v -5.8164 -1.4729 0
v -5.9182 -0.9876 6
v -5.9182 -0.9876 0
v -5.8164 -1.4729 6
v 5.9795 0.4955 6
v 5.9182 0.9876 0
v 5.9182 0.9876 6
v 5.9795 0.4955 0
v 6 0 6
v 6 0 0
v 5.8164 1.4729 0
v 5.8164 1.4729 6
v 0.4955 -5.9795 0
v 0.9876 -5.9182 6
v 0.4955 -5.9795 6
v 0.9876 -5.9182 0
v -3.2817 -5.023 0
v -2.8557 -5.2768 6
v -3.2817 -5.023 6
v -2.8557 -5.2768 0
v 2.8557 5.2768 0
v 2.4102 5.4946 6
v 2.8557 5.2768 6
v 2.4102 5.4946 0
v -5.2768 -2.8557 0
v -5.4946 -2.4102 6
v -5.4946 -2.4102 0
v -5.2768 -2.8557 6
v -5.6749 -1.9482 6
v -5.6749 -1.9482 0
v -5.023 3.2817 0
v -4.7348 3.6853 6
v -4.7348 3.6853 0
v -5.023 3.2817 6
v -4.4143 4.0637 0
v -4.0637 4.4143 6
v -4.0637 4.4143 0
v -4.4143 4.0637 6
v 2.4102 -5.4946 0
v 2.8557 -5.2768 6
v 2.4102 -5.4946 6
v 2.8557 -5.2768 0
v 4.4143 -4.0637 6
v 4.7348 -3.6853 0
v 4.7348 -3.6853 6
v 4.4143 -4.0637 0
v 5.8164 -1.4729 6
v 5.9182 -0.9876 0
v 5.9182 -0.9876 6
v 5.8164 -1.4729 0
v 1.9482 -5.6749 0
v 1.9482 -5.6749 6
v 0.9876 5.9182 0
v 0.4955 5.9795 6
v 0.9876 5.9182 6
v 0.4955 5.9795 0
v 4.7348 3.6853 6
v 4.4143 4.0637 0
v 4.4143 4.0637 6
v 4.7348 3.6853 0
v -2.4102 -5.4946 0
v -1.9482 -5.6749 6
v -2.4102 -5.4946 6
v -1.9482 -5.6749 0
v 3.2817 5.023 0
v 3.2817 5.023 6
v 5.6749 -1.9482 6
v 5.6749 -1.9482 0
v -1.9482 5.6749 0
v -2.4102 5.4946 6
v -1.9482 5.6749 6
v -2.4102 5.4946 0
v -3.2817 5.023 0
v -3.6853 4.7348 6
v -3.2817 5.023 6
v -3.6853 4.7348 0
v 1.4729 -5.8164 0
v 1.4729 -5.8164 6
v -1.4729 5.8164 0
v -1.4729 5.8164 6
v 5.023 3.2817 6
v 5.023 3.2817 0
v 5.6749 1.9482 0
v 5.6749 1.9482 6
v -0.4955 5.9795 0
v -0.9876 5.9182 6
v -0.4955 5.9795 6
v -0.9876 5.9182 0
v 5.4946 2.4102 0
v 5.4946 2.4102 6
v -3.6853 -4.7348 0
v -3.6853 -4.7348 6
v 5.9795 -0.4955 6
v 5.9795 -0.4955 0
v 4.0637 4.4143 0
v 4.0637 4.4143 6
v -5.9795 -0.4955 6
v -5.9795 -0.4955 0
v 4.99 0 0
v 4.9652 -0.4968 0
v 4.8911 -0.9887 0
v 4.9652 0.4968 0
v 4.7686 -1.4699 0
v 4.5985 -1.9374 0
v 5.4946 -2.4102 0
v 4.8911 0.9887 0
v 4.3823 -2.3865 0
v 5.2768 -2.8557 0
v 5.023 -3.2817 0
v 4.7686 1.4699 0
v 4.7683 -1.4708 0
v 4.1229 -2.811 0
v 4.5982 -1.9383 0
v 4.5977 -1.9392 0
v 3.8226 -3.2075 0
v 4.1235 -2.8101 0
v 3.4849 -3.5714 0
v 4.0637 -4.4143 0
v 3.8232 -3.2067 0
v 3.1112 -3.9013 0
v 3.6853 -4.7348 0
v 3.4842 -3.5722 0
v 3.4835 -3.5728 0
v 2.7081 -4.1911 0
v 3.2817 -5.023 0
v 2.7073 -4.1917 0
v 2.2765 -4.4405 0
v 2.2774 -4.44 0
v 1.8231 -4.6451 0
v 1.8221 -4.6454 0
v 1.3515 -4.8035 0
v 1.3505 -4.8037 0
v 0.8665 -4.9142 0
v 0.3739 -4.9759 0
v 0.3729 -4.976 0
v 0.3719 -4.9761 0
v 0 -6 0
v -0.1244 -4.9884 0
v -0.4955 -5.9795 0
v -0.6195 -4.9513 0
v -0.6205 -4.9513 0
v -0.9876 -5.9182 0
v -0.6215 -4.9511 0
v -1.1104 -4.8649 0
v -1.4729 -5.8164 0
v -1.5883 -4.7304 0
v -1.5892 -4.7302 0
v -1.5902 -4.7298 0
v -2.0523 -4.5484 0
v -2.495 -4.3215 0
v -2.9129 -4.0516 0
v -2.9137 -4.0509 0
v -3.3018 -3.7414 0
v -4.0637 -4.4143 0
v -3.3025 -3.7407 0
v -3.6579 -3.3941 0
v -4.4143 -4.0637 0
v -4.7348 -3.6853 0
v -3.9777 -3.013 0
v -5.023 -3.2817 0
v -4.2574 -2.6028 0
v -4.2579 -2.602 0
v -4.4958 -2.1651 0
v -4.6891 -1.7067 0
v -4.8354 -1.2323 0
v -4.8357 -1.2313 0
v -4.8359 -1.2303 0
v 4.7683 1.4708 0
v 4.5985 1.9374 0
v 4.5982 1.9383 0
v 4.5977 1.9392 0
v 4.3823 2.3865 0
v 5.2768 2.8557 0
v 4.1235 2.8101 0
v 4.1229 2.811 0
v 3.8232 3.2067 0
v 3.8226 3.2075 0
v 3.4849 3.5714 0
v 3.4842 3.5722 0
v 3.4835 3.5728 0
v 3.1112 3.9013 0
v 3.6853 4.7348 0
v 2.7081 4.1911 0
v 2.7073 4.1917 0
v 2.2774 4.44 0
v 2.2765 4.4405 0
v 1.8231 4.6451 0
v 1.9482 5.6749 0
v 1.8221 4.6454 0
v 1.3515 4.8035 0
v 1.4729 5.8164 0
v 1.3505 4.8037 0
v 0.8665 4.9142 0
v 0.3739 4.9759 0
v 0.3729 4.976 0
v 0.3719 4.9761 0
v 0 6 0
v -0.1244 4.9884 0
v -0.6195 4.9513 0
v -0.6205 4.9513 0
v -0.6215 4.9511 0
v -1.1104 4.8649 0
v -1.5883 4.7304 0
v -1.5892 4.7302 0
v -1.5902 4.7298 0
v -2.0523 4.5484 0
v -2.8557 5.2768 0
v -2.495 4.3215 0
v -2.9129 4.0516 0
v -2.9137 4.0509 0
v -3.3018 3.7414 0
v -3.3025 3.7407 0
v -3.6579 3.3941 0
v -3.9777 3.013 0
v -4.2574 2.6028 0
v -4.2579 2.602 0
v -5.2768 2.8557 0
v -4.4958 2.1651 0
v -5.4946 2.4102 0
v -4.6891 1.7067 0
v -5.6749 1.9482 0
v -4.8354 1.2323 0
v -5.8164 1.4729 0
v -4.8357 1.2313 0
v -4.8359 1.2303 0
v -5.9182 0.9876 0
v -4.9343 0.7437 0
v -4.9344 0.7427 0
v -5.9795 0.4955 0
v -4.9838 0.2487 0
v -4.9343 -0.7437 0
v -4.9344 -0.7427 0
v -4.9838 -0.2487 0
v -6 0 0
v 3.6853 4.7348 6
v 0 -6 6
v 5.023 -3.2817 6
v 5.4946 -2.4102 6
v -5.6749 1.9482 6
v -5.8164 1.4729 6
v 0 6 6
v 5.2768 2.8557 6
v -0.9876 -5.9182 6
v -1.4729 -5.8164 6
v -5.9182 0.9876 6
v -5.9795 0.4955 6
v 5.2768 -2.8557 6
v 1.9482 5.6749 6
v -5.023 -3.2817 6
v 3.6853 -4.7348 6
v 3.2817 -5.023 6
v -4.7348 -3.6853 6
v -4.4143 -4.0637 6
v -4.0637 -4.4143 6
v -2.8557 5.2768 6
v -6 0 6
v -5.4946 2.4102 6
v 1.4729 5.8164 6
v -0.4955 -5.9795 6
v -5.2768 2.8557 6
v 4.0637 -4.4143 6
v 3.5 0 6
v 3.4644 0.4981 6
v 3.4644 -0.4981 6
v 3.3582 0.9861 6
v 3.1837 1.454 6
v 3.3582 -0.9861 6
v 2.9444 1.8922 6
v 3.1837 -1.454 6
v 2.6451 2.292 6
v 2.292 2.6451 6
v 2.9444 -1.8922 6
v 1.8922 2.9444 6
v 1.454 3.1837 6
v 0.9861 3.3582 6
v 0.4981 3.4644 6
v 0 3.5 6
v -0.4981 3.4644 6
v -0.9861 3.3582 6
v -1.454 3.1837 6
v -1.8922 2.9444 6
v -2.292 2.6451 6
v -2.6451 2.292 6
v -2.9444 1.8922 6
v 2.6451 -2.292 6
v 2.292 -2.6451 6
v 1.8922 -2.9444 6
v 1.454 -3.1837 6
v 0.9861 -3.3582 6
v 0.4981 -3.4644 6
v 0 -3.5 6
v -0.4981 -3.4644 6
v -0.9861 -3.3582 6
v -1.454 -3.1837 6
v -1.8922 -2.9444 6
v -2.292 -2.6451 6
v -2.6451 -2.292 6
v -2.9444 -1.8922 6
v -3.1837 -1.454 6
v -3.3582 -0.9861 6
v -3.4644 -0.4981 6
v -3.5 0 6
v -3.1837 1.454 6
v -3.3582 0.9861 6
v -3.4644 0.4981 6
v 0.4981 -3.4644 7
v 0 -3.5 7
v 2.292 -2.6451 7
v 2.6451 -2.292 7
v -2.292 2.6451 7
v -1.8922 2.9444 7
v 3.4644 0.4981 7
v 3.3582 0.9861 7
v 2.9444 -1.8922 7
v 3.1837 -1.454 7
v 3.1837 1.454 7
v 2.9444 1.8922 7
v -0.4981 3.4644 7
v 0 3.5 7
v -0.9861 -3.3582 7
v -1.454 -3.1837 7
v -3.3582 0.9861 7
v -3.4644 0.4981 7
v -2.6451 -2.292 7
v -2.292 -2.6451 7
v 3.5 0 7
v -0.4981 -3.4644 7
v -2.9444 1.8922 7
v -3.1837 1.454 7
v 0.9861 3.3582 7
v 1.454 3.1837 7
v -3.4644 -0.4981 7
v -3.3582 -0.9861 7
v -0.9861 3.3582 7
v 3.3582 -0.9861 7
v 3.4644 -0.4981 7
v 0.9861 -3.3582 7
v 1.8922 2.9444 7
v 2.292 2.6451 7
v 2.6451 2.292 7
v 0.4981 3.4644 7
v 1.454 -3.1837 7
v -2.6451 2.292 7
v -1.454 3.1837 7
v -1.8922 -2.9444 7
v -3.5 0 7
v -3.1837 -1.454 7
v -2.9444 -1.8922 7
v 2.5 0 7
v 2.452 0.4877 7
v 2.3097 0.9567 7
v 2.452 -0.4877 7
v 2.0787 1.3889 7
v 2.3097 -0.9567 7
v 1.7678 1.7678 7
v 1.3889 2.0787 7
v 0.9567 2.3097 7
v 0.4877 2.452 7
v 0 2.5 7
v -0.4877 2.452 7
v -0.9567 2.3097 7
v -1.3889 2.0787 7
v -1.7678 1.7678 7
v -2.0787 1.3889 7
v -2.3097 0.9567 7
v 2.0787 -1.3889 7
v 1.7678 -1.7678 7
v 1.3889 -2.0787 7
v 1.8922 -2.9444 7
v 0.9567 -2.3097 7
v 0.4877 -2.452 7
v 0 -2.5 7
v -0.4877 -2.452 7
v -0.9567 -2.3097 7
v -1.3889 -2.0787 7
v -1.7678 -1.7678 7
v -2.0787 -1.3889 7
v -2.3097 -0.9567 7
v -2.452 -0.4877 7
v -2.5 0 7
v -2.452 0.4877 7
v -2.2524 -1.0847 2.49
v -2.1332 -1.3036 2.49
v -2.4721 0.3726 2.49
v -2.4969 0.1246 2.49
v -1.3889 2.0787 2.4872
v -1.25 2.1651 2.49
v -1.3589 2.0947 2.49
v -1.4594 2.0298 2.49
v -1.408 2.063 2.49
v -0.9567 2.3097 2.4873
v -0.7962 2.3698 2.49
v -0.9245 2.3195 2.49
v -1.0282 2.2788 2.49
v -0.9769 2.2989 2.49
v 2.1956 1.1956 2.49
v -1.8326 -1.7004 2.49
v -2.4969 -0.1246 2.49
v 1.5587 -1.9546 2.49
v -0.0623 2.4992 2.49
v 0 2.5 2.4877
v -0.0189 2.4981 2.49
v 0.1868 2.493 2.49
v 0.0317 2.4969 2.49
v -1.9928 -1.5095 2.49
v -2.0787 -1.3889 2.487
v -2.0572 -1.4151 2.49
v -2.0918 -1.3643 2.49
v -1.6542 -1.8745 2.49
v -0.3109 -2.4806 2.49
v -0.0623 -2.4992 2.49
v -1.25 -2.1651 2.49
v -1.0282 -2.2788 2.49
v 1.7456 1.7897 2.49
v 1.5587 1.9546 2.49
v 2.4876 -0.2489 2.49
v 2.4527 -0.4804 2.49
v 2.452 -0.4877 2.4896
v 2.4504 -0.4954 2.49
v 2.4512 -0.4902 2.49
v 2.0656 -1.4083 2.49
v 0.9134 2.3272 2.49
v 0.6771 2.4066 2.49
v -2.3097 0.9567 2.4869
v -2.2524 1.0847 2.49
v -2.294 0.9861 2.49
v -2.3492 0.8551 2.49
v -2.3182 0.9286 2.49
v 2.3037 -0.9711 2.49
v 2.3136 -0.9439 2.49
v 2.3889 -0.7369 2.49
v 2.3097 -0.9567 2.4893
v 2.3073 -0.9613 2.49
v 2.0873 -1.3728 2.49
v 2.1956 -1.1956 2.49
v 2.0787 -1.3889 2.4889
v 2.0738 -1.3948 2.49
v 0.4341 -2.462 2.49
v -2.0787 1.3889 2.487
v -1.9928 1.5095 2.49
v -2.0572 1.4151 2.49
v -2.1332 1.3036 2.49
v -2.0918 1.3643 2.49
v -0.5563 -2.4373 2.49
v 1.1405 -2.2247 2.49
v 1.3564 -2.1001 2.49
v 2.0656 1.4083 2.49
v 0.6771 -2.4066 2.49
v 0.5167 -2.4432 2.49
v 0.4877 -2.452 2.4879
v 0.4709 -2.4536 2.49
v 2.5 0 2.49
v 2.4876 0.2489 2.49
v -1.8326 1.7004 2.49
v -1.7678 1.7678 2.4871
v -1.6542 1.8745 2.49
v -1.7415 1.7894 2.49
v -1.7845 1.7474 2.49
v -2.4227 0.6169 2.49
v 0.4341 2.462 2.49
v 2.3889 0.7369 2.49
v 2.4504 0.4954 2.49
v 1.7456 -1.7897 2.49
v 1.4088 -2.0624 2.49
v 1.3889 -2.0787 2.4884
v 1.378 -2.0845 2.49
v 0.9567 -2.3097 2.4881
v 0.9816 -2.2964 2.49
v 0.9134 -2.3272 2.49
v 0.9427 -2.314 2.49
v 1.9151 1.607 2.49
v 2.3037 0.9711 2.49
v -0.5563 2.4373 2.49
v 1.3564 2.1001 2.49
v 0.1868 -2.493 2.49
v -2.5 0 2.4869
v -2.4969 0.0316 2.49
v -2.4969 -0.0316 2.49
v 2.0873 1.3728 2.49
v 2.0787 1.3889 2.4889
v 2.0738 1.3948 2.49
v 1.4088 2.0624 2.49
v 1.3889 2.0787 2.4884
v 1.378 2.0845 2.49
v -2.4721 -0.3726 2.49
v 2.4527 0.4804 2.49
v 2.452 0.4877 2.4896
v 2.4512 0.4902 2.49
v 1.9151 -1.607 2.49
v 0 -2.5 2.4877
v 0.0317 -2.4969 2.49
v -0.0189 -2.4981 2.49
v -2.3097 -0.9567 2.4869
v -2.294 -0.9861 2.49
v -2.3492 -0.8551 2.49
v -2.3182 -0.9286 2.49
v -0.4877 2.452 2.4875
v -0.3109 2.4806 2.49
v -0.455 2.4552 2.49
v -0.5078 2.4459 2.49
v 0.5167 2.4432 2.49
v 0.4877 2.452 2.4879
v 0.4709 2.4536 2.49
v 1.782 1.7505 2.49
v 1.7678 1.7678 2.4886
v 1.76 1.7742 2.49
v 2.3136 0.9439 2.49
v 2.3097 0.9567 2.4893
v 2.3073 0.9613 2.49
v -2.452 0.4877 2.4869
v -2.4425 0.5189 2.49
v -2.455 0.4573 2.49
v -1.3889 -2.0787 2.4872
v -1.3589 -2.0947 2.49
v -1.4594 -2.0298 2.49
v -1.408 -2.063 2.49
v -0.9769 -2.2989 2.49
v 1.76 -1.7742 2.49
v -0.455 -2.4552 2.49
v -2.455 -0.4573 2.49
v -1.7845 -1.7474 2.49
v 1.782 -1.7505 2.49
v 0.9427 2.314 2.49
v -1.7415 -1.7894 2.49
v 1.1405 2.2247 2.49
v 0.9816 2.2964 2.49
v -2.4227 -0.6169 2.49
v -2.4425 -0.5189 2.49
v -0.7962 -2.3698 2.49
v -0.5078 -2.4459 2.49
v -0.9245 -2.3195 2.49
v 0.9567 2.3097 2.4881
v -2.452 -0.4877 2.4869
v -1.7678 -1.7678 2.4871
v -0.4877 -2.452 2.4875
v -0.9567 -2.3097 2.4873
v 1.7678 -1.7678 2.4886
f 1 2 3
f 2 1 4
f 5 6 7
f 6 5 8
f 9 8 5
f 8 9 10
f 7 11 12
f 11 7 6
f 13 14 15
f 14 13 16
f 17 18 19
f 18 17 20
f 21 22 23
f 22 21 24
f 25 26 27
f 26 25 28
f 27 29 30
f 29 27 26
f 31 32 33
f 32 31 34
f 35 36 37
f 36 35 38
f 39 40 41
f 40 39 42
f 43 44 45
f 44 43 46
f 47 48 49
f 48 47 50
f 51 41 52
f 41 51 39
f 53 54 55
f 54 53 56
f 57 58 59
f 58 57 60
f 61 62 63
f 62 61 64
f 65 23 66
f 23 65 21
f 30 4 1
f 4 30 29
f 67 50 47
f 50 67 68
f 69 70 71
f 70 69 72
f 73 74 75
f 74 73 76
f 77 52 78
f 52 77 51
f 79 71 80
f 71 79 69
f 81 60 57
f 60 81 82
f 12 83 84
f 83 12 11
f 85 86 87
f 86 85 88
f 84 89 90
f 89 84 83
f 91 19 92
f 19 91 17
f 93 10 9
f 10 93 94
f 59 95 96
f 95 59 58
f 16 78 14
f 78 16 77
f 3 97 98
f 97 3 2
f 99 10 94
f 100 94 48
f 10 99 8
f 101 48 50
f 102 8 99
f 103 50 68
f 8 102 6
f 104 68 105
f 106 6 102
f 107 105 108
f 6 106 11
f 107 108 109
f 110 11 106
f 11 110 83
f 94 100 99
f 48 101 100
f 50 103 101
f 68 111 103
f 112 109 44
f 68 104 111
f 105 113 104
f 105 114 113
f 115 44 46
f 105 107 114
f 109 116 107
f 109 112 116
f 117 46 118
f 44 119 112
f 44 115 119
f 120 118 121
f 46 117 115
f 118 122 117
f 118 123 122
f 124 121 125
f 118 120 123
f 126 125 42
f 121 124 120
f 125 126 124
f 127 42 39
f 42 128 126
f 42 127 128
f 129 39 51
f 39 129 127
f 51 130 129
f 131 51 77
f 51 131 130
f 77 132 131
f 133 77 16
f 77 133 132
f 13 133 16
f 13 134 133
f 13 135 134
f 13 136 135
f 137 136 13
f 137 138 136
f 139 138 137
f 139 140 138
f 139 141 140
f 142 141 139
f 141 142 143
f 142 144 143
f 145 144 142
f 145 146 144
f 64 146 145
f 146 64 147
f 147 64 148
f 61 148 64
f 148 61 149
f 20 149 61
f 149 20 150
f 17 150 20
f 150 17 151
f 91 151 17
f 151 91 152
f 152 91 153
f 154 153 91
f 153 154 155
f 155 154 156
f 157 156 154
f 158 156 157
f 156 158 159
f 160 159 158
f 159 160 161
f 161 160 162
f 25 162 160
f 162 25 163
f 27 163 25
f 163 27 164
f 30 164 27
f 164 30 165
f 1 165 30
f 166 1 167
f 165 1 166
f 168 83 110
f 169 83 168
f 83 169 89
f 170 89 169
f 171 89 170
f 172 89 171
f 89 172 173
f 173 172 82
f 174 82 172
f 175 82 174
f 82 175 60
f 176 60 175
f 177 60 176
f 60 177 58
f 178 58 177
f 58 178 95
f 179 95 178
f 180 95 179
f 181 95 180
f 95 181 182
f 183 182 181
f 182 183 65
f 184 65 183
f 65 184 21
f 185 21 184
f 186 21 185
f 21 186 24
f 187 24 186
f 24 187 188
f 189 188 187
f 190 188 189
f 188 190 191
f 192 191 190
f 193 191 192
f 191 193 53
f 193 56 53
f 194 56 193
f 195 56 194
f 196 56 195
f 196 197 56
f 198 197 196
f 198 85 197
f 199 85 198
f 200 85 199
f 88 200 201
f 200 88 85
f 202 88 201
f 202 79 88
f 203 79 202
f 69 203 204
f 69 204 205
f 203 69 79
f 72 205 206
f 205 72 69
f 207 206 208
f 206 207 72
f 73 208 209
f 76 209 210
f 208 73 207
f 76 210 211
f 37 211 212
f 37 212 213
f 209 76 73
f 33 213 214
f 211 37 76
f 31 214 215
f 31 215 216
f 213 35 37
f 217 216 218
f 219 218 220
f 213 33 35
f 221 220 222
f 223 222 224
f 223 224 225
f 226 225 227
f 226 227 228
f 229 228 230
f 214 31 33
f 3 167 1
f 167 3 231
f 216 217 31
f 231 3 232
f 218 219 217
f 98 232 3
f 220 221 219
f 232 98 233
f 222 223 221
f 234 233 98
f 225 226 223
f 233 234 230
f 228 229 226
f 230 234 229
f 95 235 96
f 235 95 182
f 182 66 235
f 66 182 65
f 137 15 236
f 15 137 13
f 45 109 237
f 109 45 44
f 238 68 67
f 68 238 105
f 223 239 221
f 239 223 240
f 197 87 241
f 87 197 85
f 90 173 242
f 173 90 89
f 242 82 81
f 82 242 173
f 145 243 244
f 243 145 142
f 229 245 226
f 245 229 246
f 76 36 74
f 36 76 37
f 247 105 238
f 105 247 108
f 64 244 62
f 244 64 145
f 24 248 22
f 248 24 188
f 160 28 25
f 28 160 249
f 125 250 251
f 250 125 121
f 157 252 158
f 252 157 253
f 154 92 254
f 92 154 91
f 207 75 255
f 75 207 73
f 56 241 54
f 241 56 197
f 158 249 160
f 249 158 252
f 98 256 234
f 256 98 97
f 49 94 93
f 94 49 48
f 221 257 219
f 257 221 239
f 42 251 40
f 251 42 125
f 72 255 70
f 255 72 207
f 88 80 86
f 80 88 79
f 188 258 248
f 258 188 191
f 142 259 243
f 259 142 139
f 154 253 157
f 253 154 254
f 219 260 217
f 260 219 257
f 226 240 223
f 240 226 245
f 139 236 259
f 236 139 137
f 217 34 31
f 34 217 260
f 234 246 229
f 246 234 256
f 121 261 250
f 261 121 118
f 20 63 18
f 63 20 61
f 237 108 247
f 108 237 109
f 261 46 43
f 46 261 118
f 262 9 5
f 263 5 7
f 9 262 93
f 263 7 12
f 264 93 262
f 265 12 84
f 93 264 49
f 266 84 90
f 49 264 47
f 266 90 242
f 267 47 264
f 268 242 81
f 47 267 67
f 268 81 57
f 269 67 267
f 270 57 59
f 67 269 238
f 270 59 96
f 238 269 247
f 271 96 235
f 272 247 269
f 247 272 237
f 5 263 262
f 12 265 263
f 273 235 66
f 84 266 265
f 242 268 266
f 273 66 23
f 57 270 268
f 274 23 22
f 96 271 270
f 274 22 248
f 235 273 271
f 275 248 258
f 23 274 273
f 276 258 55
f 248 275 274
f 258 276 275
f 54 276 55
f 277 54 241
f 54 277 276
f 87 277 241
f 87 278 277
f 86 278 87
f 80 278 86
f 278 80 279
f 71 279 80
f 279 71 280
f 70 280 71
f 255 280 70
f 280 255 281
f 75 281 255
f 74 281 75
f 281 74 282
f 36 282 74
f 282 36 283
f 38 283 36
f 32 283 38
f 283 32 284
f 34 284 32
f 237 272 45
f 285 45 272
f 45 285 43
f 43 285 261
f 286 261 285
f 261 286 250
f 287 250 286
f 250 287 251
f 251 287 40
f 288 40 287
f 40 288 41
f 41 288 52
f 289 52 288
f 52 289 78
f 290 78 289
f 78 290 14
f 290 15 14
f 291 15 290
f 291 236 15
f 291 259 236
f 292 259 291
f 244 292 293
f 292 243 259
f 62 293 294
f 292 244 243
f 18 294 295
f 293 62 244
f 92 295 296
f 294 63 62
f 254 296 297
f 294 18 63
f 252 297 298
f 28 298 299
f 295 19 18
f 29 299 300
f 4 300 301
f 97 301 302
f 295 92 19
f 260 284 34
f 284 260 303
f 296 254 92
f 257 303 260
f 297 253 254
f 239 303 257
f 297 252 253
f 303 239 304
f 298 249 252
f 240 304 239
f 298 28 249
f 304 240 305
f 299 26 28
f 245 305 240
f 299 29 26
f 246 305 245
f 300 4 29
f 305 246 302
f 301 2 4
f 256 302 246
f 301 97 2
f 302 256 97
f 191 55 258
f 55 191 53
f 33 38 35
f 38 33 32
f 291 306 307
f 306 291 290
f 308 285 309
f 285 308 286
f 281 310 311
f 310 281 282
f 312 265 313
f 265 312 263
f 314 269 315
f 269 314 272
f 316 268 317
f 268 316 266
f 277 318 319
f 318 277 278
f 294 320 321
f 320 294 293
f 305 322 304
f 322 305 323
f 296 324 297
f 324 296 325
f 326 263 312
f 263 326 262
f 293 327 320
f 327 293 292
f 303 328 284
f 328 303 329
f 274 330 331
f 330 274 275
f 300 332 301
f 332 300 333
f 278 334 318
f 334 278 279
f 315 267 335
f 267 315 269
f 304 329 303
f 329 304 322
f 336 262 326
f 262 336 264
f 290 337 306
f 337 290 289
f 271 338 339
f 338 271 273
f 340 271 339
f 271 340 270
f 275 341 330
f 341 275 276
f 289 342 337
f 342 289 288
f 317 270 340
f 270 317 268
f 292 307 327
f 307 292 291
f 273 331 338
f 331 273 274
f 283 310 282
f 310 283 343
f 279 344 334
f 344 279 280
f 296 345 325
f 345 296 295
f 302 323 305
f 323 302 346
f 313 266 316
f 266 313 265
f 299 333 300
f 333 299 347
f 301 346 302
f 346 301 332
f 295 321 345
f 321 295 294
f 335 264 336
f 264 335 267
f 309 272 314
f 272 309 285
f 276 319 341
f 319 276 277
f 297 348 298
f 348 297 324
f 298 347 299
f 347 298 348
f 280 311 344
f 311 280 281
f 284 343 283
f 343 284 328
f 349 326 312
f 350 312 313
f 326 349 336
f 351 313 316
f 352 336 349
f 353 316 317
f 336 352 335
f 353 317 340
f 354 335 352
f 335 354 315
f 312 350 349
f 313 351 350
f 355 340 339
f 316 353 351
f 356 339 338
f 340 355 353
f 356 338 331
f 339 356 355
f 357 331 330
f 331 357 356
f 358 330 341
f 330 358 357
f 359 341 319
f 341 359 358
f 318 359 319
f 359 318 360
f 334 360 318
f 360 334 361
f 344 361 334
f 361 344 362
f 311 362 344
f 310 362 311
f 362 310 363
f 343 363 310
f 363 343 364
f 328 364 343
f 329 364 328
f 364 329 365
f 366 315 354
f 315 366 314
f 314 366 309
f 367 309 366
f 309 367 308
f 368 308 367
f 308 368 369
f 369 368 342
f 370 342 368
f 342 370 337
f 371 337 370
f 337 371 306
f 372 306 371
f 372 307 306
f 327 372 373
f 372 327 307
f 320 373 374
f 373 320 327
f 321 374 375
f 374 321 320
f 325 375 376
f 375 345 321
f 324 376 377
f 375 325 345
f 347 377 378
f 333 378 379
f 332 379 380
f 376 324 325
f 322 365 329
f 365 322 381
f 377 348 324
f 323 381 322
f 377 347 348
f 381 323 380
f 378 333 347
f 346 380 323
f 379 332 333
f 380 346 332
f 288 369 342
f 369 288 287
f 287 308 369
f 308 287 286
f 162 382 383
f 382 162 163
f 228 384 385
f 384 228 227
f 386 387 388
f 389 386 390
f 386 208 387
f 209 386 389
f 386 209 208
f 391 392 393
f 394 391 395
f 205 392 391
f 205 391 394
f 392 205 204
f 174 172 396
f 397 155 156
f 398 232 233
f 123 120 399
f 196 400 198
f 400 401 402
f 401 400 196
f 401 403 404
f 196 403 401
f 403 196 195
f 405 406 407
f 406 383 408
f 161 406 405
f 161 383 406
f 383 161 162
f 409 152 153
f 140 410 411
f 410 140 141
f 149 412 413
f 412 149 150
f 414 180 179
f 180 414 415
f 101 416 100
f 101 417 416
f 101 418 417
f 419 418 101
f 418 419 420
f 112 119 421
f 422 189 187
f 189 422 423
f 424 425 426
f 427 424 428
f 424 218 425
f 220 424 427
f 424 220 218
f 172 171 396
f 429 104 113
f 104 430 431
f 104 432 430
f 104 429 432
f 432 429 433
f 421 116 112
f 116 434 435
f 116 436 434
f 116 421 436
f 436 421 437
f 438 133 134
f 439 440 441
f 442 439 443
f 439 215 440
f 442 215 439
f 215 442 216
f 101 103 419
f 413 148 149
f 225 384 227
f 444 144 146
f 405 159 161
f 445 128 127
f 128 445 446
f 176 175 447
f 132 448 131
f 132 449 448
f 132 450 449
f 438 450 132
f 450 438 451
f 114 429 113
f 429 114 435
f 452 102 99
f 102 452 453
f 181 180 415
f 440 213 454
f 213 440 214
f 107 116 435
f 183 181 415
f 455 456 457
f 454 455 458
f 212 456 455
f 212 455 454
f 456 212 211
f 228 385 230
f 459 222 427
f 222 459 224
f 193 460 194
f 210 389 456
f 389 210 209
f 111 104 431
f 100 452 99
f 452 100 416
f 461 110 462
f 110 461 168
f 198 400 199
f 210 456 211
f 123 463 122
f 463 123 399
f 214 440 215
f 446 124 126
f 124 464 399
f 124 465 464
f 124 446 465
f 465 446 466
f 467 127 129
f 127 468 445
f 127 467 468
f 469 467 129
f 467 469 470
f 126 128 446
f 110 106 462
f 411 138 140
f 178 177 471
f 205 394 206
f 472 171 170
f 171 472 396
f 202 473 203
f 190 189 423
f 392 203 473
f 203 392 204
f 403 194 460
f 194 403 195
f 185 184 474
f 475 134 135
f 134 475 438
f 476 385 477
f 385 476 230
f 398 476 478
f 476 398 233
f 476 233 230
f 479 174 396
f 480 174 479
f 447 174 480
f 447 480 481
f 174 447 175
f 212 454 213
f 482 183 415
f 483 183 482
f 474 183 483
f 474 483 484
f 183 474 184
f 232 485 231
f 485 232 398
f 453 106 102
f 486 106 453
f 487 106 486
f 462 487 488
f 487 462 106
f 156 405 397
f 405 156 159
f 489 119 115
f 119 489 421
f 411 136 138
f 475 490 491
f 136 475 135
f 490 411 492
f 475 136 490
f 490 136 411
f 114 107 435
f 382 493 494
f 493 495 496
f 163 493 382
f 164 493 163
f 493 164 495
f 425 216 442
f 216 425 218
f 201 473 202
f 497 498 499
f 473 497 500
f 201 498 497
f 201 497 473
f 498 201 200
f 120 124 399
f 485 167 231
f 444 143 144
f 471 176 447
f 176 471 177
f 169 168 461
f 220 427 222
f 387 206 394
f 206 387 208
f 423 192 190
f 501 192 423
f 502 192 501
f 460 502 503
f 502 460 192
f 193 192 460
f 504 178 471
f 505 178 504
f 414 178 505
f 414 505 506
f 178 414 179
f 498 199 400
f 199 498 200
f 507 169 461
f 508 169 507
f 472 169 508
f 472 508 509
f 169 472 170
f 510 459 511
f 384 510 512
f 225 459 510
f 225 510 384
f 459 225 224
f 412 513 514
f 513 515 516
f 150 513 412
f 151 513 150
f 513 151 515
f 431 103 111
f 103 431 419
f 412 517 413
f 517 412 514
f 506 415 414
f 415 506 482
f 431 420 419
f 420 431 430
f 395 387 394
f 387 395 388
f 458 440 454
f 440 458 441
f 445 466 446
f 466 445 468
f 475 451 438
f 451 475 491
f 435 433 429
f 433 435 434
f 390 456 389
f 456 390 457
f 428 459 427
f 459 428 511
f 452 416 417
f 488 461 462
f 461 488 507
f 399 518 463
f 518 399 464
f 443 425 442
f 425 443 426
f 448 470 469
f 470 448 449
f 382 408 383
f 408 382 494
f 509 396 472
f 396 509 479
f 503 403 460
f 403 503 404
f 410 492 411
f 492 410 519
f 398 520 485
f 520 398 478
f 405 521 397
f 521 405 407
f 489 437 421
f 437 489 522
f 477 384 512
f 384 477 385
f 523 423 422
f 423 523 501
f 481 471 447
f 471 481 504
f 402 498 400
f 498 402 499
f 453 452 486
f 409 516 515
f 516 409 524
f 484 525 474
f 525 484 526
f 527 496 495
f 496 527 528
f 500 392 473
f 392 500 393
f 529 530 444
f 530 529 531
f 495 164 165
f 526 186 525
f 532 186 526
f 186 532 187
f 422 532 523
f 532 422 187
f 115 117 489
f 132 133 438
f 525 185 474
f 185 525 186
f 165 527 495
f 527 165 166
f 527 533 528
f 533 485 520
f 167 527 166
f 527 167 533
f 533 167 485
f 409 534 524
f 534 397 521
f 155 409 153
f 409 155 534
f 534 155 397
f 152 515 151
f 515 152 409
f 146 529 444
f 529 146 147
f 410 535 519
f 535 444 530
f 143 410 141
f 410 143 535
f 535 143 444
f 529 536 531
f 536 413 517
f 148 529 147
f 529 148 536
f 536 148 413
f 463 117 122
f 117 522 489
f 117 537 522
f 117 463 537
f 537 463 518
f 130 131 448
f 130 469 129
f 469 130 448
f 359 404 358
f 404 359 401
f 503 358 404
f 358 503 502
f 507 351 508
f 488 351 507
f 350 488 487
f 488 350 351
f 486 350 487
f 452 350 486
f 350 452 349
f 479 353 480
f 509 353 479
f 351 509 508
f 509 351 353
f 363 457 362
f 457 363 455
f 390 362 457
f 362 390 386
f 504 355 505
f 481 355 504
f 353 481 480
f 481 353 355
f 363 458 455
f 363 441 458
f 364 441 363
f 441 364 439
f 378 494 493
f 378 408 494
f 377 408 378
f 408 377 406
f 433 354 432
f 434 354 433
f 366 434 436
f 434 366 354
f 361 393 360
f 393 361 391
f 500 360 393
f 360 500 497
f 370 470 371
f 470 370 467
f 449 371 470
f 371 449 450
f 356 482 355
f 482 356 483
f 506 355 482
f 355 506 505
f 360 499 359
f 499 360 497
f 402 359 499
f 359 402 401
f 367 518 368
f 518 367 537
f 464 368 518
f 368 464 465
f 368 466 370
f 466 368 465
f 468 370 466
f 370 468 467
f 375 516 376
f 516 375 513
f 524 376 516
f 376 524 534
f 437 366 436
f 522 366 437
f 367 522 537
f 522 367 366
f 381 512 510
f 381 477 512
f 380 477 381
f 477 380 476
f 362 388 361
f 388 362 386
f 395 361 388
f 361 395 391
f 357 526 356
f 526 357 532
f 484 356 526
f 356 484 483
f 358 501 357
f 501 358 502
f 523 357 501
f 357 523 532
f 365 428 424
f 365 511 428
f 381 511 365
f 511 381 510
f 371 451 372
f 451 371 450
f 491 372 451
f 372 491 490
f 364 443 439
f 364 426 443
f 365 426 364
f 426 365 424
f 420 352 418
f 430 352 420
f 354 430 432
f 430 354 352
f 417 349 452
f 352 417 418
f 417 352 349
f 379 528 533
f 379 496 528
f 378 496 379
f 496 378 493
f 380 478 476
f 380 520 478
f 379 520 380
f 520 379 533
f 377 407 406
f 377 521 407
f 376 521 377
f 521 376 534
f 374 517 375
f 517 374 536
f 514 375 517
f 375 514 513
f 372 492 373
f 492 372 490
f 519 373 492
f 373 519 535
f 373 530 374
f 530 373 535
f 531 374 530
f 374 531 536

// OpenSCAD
$fa=1/1;
$fs=1/2;
bissl=1/100;
thickness=1;
hole=7;
height=7;
head=10;
id=5;
od=12;
difference() {
  union() {
    cylinder(h=height-thickness,d=od);
    cylinder(h=height,d=hole);
  }
  translate([0,0,-bissl])cylinder(d1=head,d2=id,h=(head-id)/2);
  cylinder(d=id,h=height+bissl);
}
